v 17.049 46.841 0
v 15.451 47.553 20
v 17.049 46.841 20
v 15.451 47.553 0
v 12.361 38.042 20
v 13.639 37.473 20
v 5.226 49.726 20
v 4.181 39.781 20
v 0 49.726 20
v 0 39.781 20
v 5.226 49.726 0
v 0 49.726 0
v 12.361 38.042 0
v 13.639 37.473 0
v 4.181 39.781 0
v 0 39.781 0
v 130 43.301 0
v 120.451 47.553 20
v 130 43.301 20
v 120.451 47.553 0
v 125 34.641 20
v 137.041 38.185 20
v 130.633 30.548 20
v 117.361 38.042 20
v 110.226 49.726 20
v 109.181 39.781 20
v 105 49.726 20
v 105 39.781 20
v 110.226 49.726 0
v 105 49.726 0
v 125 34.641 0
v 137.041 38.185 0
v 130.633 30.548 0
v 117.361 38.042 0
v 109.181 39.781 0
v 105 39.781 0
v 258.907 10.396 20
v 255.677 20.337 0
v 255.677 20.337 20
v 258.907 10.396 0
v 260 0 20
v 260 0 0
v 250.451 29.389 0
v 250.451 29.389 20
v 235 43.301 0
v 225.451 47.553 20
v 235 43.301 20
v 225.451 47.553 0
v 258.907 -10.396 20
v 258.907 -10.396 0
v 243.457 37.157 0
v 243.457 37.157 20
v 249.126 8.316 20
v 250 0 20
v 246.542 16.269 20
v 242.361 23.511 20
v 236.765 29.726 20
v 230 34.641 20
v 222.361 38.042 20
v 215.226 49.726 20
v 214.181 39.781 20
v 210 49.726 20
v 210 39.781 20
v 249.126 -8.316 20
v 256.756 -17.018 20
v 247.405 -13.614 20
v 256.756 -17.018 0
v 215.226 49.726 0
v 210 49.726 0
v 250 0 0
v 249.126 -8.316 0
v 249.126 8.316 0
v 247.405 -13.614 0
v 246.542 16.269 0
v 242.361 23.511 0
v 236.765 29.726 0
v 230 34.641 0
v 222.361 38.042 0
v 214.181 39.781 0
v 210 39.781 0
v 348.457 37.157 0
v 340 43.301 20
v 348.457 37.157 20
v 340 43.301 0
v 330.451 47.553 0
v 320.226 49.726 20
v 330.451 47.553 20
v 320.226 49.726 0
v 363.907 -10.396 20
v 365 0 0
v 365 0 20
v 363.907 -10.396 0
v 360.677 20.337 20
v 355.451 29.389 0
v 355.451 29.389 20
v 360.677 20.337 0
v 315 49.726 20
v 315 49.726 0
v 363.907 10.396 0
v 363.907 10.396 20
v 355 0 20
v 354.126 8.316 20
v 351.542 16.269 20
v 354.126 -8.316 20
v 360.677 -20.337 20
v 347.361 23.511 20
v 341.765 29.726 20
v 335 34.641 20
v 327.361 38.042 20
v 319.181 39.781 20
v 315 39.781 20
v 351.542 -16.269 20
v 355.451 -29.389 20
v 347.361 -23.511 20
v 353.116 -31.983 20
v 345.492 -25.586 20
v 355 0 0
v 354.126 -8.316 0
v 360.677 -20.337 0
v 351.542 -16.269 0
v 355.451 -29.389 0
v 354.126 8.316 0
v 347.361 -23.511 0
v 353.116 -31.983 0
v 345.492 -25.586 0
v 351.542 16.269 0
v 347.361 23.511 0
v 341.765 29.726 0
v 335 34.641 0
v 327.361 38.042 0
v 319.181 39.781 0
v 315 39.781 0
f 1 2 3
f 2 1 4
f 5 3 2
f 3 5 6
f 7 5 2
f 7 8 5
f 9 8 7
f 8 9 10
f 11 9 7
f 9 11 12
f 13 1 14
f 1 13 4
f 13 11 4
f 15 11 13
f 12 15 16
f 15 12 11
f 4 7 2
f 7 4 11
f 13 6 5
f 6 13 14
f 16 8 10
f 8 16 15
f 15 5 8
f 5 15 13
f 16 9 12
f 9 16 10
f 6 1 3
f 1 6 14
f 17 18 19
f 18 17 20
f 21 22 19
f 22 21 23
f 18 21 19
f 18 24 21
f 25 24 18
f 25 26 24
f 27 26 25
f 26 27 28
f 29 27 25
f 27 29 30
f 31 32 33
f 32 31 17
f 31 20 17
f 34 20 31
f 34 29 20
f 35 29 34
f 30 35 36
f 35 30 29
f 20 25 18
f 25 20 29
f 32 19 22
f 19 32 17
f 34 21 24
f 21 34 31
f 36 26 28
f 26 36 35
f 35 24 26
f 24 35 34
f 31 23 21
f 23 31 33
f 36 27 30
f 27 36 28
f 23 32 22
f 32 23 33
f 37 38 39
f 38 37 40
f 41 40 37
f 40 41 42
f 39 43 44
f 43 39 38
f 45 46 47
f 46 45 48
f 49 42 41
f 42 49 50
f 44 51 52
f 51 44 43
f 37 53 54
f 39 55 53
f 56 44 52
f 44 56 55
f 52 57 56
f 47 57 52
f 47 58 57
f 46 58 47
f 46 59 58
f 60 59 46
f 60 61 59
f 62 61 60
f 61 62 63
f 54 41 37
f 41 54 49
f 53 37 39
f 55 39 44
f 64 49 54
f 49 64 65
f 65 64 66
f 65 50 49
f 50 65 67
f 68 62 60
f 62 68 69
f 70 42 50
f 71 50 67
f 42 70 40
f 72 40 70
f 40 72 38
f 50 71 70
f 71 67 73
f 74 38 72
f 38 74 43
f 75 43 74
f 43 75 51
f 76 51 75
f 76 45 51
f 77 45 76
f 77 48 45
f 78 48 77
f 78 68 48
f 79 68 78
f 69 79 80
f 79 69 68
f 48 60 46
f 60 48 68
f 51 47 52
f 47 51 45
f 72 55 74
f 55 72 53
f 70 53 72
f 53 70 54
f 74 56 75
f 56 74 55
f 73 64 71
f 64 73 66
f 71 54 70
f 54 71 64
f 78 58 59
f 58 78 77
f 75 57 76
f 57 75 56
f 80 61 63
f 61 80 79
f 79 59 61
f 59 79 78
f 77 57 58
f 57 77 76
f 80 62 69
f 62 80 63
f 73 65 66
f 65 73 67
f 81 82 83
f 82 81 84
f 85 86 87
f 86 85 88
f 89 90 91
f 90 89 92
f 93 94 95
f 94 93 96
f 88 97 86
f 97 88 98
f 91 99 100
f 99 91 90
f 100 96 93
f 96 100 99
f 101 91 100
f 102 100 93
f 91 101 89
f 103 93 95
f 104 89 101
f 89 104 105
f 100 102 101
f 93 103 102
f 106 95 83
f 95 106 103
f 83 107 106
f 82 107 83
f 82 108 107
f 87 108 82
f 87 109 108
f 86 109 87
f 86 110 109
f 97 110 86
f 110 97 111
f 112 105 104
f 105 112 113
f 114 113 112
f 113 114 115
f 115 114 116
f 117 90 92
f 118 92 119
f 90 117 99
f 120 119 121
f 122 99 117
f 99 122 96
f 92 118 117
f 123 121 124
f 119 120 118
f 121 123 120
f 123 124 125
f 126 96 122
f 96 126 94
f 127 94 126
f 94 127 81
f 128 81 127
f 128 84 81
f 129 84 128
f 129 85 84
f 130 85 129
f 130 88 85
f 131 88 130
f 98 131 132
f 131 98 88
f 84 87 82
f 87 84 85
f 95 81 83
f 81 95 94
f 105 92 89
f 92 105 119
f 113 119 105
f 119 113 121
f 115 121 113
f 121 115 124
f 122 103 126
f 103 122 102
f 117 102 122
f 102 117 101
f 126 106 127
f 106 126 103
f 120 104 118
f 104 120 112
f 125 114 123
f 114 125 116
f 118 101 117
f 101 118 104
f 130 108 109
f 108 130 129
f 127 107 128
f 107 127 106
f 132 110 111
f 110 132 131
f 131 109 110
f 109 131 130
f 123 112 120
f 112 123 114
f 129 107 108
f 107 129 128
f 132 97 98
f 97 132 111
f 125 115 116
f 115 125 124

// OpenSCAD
// file: ../src/cadence.scad
// pineapple slice
//
module paslice(radius, depth, slice=45, center=false, radius1=0) {

  difference() {

    cylinder(depth, r=radius, center=center);

    translate([ 0, 0, -0.1 ])
      cylinder(depth * 1.1, r=radius1, center=center);

    cz = (center ? - depth / 2 : 0) - 0.1;
    d = depth + 0.2;

    if (slice <= 90)
      translate([ 0, -radius, cz ]) cube([ radius, radius, d ]);
    if (slice <= 180)
      translate([ -radius, -radius, cz ]) cube([ radius, radius, d ]);
    if (slice <= 270)
      translate([ -radius, 0, cz ]) cube([ radius, radius, d ]);

    a = - floor(slice / 90) * 90;
    s = 90 - slice % 90;
    echo(s);
    if (s != 90) {
      opp = radius * tan(s);
      translate([ 0, 0, -0.1 ]) rotate([ 0, 0, a ]) linear_extrude(d)
        polygon([ [ 0, 0 ], [ radius, 0 ], [ radius, opp ] ]);
    }
  }
}
// main file
// test_paslice.scad

use <../src/cadence.scad>;

d = 105;
slices = [ 20, 40, 90 + 20, 90 + 40 ];

for (i = [ 0 : len(slices) - 1]) {
  translate([ i * d, 0, 0 ]) paslice(50, 20, radius1=40, slice=slices[i]);
}
